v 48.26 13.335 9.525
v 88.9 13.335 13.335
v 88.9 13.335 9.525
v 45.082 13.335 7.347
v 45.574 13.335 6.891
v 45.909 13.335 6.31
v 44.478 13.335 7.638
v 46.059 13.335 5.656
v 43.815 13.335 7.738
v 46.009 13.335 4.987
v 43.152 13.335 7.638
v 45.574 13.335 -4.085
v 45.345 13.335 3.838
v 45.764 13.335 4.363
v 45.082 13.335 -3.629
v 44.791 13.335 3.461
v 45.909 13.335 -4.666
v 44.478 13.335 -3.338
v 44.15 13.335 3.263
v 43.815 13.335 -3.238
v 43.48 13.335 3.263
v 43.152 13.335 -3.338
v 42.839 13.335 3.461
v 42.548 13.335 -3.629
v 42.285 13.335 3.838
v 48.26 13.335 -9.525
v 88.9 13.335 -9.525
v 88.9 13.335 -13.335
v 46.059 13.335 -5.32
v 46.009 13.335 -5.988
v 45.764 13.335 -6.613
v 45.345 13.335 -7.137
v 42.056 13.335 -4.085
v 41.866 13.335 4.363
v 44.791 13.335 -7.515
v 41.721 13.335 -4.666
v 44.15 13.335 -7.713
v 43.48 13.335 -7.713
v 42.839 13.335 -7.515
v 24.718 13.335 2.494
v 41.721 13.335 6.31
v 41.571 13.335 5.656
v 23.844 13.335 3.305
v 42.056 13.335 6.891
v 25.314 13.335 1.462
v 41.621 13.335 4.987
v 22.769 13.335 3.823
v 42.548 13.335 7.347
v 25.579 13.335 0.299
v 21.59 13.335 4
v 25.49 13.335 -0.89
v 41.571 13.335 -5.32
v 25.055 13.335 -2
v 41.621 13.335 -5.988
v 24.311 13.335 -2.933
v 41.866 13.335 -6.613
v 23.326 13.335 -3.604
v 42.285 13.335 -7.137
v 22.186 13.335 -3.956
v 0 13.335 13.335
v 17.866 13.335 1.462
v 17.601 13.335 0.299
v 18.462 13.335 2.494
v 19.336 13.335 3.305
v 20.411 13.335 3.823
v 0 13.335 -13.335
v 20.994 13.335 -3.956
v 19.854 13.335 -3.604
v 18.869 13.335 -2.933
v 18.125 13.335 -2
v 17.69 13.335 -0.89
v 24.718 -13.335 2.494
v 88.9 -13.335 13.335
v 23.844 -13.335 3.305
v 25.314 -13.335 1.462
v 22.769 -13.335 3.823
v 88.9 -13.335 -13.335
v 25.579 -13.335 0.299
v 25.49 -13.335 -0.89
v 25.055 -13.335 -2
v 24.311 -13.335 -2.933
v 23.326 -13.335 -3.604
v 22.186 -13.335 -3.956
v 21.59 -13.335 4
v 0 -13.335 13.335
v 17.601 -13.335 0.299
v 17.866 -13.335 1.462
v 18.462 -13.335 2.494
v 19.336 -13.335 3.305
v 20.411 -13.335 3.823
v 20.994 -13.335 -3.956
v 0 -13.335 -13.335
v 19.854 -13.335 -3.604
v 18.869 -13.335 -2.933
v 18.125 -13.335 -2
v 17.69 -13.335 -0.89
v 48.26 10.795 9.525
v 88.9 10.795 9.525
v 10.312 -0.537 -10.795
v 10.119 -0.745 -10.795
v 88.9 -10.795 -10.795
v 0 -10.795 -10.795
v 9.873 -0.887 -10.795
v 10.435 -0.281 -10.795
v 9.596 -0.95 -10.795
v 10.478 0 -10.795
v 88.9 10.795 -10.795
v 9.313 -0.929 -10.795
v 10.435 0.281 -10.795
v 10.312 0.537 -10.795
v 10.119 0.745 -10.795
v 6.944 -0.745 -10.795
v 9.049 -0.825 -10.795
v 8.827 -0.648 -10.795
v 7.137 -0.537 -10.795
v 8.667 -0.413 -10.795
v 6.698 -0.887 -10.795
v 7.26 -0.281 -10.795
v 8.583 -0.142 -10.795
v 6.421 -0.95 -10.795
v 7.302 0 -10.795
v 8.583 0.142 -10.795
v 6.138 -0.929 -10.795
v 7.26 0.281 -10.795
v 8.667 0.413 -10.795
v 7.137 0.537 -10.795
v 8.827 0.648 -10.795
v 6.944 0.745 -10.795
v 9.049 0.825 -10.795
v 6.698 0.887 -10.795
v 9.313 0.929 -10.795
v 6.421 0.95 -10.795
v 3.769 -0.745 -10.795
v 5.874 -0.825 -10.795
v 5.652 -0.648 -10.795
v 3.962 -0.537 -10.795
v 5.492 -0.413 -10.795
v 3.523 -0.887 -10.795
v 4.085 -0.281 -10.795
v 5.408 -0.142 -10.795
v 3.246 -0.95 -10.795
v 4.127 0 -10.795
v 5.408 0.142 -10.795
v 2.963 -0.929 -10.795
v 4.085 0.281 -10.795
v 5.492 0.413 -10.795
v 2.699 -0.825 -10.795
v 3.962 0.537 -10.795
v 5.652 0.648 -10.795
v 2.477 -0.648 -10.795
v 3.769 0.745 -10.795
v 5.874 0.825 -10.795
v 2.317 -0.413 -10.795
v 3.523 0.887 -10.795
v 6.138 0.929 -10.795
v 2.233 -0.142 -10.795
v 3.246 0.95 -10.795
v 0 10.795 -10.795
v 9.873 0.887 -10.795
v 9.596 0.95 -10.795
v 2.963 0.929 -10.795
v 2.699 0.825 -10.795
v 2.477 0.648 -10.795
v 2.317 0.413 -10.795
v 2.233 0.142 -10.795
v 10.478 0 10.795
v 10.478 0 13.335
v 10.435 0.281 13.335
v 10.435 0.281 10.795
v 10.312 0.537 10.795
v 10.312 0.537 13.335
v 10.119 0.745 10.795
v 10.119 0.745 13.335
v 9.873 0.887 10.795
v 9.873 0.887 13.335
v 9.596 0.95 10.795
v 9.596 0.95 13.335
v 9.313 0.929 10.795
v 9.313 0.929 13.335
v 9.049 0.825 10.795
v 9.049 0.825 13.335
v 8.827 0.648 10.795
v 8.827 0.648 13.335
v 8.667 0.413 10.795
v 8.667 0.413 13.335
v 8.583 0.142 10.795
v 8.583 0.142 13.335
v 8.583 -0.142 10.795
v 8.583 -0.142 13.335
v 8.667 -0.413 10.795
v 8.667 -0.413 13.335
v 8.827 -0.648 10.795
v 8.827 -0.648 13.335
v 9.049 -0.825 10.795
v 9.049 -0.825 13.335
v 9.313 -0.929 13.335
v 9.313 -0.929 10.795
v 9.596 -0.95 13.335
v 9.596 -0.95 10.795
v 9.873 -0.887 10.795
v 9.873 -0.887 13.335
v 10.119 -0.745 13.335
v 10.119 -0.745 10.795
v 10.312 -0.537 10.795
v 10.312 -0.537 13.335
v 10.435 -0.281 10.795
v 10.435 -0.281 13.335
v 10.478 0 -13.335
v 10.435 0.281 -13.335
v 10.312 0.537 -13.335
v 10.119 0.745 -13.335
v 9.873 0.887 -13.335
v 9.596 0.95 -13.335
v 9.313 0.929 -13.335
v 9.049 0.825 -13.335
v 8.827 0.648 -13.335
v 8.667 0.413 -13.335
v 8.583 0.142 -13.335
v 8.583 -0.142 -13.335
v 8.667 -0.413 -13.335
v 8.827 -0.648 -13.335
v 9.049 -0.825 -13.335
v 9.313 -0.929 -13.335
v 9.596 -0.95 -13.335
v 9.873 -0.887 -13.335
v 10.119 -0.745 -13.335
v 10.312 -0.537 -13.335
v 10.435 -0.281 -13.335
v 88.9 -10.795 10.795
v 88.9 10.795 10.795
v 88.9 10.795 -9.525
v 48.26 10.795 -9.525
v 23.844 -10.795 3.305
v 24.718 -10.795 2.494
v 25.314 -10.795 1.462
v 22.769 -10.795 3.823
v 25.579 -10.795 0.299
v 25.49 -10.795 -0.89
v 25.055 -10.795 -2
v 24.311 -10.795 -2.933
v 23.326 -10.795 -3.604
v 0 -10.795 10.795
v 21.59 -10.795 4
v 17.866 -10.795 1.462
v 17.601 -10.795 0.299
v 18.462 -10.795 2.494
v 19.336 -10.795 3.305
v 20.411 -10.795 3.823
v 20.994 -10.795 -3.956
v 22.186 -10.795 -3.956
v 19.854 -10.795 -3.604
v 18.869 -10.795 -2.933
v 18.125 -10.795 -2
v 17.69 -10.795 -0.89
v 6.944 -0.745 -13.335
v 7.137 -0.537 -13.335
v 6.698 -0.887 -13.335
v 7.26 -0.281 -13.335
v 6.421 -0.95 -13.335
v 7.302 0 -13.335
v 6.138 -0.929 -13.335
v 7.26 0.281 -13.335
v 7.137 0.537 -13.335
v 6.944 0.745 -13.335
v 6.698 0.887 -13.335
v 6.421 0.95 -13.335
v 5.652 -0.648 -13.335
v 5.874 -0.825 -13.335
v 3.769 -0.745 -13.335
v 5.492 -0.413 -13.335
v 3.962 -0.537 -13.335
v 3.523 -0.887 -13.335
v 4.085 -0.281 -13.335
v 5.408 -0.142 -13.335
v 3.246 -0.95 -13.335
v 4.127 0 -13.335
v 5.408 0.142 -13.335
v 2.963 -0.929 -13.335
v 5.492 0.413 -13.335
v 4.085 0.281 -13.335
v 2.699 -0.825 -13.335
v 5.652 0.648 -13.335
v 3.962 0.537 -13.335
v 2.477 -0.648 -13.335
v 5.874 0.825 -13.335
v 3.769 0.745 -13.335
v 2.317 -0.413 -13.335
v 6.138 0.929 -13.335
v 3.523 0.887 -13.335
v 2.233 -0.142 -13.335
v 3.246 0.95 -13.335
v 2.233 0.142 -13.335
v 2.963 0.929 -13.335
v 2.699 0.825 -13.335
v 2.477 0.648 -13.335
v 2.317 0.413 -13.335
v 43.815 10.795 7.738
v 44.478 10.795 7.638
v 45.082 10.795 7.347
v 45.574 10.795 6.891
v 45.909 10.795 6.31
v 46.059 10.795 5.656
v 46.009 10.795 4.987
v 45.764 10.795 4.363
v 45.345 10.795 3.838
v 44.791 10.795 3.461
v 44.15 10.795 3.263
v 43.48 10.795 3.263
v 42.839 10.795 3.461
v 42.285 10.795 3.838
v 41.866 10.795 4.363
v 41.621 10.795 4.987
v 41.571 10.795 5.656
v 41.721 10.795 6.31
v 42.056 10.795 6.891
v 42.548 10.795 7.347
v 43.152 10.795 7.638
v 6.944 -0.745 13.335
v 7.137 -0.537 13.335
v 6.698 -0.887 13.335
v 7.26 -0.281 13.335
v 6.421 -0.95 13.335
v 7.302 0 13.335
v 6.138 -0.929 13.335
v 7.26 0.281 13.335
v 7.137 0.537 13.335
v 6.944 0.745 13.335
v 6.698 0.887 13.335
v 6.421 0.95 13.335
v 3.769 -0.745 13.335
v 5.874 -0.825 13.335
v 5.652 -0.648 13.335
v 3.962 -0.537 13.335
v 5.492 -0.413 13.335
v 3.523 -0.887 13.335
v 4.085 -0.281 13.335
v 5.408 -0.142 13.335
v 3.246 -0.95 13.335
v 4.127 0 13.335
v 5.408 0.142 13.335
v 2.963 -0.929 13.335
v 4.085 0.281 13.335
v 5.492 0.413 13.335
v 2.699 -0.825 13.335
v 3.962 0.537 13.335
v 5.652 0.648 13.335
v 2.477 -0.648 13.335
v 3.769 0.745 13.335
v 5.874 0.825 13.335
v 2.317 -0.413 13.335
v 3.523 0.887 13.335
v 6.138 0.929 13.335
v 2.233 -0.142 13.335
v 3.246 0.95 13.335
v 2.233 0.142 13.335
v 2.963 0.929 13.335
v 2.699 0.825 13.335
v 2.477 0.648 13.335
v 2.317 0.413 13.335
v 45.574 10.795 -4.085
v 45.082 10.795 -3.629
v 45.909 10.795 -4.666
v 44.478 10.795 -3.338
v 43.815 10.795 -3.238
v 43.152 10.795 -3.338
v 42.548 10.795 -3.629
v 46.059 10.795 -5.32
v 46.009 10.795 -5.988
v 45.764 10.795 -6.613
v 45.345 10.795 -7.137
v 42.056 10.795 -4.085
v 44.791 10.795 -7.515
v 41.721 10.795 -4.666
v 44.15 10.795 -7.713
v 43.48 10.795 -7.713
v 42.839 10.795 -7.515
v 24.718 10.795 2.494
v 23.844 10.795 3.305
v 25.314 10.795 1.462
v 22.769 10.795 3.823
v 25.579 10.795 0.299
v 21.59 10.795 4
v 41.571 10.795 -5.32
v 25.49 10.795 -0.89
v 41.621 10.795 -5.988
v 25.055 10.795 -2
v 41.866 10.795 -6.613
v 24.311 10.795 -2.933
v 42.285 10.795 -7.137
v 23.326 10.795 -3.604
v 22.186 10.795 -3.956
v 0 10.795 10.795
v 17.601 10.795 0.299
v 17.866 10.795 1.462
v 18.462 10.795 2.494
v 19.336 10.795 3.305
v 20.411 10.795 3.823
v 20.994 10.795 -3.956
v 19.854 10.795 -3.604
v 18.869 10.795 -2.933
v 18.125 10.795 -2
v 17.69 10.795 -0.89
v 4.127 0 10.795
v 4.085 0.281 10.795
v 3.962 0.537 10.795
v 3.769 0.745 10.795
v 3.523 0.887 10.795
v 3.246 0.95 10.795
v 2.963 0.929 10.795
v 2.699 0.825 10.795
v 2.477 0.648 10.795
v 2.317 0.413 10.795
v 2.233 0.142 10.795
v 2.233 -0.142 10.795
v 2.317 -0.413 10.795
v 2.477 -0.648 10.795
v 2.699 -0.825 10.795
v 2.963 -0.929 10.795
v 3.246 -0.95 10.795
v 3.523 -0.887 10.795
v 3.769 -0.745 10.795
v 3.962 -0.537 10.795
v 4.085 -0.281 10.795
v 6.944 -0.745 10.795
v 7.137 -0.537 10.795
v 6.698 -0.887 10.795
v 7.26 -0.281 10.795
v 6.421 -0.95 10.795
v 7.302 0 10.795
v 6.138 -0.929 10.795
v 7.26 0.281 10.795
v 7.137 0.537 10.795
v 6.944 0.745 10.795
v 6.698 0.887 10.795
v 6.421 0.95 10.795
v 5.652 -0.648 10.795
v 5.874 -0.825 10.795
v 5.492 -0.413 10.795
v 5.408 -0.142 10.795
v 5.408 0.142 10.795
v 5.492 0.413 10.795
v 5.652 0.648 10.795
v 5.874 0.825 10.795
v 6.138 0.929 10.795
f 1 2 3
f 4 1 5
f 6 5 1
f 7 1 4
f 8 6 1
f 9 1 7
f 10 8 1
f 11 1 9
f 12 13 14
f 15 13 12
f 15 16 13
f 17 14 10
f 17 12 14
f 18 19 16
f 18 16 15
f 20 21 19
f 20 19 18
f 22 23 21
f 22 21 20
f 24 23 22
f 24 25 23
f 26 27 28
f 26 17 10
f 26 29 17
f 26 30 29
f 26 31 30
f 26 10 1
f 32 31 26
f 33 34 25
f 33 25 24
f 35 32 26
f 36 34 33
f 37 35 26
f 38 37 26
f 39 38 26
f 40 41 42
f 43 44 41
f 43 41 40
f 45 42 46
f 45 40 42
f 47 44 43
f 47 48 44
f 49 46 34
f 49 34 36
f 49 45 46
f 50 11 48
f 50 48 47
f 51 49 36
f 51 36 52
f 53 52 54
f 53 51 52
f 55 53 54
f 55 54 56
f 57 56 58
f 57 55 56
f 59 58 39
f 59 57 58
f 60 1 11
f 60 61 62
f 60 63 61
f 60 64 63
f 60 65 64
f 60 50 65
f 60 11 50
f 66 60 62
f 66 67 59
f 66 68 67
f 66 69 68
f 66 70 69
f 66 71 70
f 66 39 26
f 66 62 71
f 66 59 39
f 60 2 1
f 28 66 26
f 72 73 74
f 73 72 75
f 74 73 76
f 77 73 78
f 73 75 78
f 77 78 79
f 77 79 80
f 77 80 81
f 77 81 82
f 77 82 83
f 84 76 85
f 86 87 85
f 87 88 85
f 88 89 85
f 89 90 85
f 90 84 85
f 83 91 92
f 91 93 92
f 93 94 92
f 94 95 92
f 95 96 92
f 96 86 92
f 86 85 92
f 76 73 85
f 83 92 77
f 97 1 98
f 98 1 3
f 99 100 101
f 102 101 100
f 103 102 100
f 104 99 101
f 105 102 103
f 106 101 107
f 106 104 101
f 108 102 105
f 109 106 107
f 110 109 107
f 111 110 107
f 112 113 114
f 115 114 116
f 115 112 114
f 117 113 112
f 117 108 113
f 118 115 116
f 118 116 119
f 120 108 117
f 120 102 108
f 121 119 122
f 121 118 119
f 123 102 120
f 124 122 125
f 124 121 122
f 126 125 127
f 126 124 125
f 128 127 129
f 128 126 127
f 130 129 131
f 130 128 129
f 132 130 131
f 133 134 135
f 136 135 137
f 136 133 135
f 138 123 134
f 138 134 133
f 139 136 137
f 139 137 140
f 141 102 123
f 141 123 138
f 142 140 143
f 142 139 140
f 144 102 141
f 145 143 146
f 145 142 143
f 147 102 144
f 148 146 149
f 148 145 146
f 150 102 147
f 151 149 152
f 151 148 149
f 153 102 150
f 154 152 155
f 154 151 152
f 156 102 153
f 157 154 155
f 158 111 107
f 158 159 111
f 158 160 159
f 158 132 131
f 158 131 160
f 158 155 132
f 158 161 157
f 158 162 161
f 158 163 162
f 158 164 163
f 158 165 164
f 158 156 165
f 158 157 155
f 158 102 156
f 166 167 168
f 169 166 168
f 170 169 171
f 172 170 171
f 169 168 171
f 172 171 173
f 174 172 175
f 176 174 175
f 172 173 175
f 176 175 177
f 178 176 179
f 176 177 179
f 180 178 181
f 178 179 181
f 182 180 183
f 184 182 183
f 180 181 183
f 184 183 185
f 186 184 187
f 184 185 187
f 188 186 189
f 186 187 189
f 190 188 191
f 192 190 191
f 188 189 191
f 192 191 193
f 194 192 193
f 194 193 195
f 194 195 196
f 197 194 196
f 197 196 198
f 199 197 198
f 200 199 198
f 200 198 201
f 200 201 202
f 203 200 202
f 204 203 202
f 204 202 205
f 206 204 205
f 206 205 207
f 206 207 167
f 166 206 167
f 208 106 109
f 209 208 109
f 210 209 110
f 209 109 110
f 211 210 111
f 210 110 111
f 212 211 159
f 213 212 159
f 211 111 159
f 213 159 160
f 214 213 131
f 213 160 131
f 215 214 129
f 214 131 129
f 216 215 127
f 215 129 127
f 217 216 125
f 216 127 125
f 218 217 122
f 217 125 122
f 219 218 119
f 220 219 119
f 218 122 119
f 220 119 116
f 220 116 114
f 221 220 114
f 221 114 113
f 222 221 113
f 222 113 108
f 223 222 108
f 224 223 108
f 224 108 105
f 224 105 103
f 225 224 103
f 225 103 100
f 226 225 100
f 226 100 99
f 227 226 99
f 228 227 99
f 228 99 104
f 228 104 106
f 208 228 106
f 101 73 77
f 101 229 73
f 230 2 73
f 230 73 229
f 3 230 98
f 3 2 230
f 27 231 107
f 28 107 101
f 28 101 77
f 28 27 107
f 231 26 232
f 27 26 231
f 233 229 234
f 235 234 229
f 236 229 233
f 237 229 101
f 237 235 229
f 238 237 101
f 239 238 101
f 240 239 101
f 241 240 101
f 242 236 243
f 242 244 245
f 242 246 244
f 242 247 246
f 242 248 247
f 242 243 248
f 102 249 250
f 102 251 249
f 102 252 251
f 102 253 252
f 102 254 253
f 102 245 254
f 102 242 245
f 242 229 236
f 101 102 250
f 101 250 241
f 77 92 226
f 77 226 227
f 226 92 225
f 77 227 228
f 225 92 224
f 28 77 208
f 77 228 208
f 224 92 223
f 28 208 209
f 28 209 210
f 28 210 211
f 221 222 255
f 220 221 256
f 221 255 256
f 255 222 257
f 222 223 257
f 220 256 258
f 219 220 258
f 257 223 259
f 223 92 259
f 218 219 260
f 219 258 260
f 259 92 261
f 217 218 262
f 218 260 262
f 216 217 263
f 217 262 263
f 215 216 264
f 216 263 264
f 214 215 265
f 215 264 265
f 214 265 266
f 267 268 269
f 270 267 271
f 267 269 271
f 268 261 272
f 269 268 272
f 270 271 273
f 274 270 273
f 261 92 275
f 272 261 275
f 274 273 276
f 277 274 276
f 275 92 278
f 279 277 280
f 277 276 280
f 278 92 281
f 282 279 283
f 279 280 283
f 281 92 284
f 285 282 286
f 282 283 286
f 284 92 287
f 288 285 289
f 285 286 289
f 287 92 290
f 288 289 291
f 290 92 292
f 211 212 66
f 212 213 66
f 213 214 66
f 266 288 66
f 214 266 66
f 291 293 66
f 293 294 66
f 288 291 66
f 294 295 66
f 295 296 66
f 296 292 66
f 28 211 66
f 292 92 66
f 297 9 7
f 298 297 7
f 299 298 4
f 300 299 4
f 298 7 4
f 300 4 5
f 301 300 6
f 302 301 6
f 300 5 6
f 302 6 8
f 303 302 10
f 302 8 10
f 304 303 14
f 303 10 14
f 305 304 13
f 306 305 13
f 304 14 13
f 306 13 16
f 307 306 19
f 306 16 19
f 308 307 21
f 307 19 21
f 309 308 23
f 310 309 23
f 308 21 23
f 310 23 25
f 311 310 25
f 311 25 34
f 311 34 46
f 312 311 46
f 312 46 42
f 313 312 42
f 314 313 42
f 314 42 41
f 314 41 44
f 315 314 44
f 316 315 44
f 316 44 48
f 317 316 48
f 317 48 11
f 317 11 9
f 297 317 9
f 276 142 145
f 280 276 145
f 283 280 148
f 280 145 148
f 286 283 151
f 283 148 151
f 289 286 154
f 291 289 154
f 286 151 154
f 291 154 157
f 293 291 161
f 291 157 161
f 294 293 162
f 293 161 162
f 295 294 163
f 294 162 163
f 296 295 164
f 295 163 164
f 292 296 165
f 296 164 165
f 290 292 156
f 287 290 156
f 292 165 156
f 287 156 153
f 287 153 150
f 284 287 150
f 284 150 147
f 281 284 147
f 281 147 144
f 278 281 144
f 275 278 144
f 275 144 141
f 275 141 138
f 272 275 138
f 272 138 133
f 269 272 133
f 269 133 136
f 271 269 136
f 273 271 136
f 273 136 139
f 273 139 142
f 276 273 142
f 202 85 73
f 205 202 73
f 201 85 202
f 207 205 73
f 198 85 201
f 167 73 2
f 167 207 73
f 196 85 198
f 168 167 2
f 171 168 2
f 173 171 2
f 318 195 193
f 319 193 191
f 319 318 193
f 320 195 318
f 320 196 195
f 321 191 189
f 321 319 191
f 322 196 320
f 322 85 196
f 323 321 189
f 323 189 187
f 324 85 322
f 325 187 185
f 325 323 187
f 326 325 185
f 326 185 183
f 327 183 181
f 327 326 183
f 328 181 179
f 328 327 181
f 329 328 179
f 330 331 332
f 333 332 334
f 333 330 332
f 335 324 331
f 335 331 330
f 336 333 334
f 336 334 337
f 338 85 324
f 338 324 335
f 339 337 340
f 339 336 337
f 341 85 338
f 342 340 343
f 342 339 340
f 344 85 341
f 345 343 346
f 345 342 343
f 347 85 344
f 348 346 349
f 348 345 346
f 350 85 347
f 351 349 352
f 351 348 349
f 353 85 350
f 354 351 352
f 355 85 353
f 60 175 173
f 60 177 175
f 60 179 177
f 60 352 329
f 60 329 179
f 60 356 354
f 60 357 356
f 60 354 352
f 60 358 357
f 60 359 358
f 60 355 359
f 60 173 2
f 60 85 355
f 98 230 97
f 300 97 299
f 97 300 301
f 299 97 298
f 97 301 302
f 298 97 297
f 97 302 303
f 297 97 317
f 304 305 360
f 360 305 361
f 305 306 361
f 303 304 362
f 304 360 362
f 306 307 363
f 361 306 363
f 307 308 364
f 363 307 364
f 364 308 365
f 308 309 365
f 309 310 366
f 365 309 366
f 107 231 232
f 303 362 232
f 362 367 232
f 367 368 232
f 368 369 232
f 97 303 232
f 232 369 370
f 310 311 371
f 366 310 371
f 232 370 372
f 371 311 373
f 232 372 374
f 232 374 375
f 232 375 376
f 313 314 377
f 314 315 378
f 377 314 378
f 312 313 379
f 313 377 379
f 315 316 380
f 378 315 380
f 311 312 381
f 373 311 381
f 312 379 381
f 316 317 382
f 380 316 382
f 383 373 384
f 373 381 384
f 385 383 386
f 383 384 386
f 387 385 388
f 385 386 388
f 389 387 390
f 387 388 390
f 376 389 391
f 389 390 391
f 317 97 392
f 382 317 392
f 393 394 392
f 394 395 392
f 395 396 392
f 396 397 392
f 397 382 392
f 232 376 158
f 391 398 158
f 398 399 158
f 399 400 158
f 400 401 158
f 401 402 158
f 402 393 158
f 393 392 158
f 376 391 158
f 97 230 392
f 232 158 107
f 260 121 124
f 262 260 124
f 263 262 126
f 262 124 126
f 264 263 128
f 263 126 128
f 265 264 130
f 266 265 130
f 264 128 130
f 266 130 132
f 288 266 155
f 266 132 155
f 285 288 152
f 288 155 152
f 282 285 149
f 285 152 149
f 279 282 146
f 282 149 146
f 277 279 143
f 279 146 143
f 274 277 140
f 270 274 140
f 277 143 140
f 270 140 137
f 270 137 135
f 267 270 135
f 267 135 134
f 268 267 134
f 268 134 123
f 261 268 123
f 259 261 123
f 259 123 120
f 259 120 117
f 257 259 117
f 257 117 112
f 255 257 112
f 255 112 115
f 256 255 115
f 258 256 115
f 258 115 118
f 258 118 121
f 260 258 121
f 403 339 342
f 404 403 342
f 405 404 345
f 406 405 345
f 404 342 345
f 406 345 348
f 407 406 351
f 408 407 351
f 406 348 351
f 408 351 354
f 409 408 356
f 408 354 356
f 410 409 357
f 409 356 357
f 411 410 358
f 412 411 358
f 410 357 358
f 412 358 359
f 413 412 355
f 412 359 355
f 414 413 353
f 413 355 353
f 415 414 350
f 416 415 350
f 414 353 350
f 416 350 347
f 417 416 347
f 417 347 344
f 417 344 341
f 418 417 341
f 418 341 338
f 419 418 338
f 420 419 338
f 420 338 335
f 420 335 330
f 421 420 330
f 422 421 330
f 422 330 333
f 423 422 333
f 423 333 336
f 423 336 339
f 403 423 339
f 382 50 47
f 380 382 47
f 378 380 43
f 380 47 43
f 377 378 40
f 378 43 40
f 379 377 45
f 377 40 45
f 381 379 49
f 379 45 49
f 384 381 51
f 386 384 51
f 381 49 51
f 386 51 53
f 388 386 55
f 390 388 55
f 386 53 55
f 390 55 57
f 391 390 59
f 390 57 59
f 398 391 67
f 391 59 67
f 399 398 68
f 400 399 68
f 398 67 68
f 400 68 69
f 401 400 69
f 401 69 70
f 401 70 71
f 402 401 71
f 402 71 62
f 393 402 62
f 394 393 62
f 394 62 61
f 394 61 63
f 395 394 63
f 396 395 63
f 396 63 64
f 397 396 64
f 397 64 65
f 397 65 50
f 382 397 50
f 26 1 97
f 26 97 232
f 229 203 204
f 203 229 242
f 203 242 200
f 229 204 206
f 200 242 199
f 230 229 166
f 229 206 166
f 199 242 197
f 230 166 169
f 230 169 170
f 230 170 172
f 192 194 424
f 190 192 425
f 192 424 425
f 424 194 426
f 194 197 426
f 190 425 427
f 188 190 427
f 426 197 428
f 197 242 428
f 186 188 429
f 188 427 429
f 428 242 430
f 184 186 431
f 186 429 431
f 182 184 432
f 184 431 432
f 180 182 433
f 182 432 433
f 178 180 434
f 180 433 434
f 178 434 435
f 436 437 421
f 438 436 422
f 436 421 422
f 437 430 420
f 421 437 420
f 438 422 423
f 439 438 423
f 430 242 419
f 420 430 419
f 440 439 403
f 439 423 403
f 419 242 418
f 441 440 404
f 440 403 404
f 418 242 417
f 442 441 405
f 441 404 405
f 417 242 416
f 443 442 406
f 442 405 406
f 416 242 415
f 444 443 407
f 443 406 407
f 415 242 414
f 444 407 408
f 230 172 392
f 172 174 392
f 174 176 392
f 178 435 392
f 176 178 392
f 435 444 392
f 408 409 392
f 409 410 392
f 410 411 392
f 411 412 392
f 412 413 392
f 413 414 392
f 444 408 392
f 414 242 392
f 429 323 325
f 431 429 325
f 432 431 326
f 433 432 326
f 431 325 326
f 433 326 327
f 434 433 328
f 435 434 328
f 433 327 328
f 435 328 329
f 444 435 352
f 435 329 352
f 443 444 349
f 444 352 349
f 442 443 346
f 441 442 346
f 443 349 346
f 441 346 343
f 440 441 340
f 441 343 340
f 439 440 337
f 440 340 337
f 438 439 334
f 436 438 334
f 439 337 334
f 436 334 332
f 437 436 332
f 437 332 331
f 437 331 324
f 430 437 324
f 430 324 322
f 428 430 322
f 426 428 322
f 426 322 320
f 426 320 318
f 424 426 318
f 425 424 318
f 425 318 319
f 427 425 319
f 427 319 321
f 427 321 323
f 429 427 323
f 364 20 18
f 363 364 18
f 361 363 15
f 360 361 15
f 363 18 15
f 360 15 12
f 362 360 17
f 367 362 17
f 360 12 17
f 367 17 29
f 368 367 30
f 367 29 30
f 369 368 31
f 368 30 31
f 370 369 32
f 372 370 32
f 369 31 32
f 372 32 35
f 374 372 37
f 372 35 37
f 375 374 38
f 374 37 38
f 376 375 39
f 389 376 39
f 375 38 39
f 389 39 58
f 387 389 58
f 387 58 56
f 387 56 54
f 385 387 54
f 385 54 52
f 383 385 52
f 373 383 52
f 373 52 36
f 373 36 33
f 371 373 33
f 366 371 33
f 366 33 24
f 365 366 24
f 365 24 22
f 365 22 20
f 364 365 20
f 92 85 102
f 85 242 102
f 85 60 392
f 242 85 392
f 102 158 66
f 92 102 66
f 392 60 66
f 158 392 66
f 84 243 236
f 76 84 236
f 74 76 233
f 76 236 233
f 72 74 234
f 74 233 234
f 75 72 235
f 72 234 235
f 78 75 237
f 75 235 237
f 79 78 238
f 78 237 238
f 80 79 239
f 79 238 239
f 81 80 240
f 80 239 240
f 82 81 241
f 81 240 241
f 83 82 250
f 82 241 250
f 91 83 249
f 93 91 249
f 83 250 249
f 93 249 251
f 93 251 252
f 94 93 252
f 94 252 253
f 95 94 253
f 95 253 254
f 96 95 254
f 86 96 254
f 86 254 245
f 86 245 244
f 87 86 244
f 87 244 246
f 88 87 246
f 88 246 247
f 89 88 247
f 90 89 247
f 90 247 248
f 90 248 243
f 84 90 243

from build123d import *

# Parameters (mm, degrees)
SKETCH1_W           = 26.67
SKETCH1_H           = 26.67
SKETCH1_W_2         = 21.59
SKETCH1_H_2         = 21.59
BOSS_EXTRUDE1_DEPTH = 88.9
SKETCH2_R           = 4.0005
CUT_EXTRUDE1_DEPTH  = 94.767377723
CUT_EXTRUDE2_REACH  = 95.767
SKETCH3_R           = 2.25
SKETCH3_W           = 40.64
SKETCH3_H           = 19.05
SKETCH4_R           = 0.9525
CUT_EXTRUDE3_DEPTH  = 94.767377723


with BuildPart() as part:
    # Sketch1 → Boss-Extrude1 (new body)
    with BuildSketch(Plane(origin=(0, 0, 0), x_dir=(0, 0, -1), z_dir=(1, 0, 0))):
        Rectangle(SKETCH1_W, SKETCH1_H)
        Rectangle(SKETCH1_W_2, SKETCH1_H_2, mode=Mode.SUBTRACT)
    extrude(amount=BOSS_EXTRUDE1_DEPTH)

    # Sketch2 → Cut-Extrude1 (cut, through all)
    with BuildSketch(Plane(origin=(0, 13.335, 0), x_dir=(1, 0, 0), z_dir=(0, 1, 0))):
        with Locations(Location((21.59, 0, 0), (0, 0, 270))):
            Circle(SKETCH2_R)
    extrude(amount=-CUT_EXTRUDE1_DEPTH, mode=Mode.SUBTRACT)

    # Sketch3 → Cut-Extrude2 (cut, up to next)
    with BuildSketch(Plane(origin=(0, 13.335, 0), x_dir=(1, 0, 0), z_dir=(0, 1, 0)), mode=Mode.PRIVATE) as cut_extrude2_sk1:
        with Locations(Location((43.815, 5.487743894, 0), (0, 0, 270))):
            Circle(SKETCH3_R)
    cut_extrude2_tool1 = extrude(cut_extrude2_sk1.sketch, amount=-CUT_EXTRUDE2_REACH, mode=Mode.PRIVATE) & part.part
    # Sketch3 → Cut-Extrude2 (cut, up to next)
    with BuildSketch(Plane(origin=(0, 13.335, 0), x_dir=(1, 0, 0), z_dir=(0, 1, 0)), mode=Mode.PRIVATE) as cut_extrude2_sk2:
        with Locations(Location((43.815, -5.487743894, 0), (0, 0, 270))):
            Circle(SKETCH3_R)
    cut_extrude2_tool2 = extrude(cut_extrude2_sk2.sketch, amount=-CUT_EXTRUDE2_REACH, mode=Mode.PRIVATE) & part.part
    # Sketch3 → Cut-Extrude2 (cut, up to next)
    with BuildSketch(Plane(origin=(0, 13.335, 0), x_dir=(1, 0, 0), z_dir=(0, 1, 0)), mode=Mode.PRIVATE) as cut_extrude2_sk3:
        with Locations((68.58, 0)):
            Rectangle(SKETCH3_W, SKETCH3_H)
    cut_extrude2_tool3 = extrude(cut_extrude2_sk3.sketch, amount=-CUT_EXTRUDE2_REACH, mode=Mode.PRIVATE) & part.part
    add(cut_extrude2_tool1.solids().sort_by_distance((43.815, 13.335, -5.487744))[0], mode=Mode.SUBTRACT)
    add(cut_extrude2_tool2.solids().sort_by_distance((43.815, 13.335, 5.487744))[0], mode=Mode.SUBTRACT)
    add(cut_extrude2_tool3.solids().sort_by_distance((68.58, 13.335, 0))[0], mode=Mode.SUBTRACT)

    # Sketch4 → Cut-Extrude3 (cut, through all)
    with BuildSketch(Plane.XY.offset(13.335)):
        with Locations((6.35, 0)):
            Circle(SKETCH4_R)
        with Locations((3.175, 0)):
            Circle(SKETCH4_R)
        with Locations((9.525, 0)):
            Circle(SKETCH4_R)
    extrude(amount=-CUT_EXTRUDE3_DEPTH, mode=Mode.SUBTRACT)


solid = part.part
